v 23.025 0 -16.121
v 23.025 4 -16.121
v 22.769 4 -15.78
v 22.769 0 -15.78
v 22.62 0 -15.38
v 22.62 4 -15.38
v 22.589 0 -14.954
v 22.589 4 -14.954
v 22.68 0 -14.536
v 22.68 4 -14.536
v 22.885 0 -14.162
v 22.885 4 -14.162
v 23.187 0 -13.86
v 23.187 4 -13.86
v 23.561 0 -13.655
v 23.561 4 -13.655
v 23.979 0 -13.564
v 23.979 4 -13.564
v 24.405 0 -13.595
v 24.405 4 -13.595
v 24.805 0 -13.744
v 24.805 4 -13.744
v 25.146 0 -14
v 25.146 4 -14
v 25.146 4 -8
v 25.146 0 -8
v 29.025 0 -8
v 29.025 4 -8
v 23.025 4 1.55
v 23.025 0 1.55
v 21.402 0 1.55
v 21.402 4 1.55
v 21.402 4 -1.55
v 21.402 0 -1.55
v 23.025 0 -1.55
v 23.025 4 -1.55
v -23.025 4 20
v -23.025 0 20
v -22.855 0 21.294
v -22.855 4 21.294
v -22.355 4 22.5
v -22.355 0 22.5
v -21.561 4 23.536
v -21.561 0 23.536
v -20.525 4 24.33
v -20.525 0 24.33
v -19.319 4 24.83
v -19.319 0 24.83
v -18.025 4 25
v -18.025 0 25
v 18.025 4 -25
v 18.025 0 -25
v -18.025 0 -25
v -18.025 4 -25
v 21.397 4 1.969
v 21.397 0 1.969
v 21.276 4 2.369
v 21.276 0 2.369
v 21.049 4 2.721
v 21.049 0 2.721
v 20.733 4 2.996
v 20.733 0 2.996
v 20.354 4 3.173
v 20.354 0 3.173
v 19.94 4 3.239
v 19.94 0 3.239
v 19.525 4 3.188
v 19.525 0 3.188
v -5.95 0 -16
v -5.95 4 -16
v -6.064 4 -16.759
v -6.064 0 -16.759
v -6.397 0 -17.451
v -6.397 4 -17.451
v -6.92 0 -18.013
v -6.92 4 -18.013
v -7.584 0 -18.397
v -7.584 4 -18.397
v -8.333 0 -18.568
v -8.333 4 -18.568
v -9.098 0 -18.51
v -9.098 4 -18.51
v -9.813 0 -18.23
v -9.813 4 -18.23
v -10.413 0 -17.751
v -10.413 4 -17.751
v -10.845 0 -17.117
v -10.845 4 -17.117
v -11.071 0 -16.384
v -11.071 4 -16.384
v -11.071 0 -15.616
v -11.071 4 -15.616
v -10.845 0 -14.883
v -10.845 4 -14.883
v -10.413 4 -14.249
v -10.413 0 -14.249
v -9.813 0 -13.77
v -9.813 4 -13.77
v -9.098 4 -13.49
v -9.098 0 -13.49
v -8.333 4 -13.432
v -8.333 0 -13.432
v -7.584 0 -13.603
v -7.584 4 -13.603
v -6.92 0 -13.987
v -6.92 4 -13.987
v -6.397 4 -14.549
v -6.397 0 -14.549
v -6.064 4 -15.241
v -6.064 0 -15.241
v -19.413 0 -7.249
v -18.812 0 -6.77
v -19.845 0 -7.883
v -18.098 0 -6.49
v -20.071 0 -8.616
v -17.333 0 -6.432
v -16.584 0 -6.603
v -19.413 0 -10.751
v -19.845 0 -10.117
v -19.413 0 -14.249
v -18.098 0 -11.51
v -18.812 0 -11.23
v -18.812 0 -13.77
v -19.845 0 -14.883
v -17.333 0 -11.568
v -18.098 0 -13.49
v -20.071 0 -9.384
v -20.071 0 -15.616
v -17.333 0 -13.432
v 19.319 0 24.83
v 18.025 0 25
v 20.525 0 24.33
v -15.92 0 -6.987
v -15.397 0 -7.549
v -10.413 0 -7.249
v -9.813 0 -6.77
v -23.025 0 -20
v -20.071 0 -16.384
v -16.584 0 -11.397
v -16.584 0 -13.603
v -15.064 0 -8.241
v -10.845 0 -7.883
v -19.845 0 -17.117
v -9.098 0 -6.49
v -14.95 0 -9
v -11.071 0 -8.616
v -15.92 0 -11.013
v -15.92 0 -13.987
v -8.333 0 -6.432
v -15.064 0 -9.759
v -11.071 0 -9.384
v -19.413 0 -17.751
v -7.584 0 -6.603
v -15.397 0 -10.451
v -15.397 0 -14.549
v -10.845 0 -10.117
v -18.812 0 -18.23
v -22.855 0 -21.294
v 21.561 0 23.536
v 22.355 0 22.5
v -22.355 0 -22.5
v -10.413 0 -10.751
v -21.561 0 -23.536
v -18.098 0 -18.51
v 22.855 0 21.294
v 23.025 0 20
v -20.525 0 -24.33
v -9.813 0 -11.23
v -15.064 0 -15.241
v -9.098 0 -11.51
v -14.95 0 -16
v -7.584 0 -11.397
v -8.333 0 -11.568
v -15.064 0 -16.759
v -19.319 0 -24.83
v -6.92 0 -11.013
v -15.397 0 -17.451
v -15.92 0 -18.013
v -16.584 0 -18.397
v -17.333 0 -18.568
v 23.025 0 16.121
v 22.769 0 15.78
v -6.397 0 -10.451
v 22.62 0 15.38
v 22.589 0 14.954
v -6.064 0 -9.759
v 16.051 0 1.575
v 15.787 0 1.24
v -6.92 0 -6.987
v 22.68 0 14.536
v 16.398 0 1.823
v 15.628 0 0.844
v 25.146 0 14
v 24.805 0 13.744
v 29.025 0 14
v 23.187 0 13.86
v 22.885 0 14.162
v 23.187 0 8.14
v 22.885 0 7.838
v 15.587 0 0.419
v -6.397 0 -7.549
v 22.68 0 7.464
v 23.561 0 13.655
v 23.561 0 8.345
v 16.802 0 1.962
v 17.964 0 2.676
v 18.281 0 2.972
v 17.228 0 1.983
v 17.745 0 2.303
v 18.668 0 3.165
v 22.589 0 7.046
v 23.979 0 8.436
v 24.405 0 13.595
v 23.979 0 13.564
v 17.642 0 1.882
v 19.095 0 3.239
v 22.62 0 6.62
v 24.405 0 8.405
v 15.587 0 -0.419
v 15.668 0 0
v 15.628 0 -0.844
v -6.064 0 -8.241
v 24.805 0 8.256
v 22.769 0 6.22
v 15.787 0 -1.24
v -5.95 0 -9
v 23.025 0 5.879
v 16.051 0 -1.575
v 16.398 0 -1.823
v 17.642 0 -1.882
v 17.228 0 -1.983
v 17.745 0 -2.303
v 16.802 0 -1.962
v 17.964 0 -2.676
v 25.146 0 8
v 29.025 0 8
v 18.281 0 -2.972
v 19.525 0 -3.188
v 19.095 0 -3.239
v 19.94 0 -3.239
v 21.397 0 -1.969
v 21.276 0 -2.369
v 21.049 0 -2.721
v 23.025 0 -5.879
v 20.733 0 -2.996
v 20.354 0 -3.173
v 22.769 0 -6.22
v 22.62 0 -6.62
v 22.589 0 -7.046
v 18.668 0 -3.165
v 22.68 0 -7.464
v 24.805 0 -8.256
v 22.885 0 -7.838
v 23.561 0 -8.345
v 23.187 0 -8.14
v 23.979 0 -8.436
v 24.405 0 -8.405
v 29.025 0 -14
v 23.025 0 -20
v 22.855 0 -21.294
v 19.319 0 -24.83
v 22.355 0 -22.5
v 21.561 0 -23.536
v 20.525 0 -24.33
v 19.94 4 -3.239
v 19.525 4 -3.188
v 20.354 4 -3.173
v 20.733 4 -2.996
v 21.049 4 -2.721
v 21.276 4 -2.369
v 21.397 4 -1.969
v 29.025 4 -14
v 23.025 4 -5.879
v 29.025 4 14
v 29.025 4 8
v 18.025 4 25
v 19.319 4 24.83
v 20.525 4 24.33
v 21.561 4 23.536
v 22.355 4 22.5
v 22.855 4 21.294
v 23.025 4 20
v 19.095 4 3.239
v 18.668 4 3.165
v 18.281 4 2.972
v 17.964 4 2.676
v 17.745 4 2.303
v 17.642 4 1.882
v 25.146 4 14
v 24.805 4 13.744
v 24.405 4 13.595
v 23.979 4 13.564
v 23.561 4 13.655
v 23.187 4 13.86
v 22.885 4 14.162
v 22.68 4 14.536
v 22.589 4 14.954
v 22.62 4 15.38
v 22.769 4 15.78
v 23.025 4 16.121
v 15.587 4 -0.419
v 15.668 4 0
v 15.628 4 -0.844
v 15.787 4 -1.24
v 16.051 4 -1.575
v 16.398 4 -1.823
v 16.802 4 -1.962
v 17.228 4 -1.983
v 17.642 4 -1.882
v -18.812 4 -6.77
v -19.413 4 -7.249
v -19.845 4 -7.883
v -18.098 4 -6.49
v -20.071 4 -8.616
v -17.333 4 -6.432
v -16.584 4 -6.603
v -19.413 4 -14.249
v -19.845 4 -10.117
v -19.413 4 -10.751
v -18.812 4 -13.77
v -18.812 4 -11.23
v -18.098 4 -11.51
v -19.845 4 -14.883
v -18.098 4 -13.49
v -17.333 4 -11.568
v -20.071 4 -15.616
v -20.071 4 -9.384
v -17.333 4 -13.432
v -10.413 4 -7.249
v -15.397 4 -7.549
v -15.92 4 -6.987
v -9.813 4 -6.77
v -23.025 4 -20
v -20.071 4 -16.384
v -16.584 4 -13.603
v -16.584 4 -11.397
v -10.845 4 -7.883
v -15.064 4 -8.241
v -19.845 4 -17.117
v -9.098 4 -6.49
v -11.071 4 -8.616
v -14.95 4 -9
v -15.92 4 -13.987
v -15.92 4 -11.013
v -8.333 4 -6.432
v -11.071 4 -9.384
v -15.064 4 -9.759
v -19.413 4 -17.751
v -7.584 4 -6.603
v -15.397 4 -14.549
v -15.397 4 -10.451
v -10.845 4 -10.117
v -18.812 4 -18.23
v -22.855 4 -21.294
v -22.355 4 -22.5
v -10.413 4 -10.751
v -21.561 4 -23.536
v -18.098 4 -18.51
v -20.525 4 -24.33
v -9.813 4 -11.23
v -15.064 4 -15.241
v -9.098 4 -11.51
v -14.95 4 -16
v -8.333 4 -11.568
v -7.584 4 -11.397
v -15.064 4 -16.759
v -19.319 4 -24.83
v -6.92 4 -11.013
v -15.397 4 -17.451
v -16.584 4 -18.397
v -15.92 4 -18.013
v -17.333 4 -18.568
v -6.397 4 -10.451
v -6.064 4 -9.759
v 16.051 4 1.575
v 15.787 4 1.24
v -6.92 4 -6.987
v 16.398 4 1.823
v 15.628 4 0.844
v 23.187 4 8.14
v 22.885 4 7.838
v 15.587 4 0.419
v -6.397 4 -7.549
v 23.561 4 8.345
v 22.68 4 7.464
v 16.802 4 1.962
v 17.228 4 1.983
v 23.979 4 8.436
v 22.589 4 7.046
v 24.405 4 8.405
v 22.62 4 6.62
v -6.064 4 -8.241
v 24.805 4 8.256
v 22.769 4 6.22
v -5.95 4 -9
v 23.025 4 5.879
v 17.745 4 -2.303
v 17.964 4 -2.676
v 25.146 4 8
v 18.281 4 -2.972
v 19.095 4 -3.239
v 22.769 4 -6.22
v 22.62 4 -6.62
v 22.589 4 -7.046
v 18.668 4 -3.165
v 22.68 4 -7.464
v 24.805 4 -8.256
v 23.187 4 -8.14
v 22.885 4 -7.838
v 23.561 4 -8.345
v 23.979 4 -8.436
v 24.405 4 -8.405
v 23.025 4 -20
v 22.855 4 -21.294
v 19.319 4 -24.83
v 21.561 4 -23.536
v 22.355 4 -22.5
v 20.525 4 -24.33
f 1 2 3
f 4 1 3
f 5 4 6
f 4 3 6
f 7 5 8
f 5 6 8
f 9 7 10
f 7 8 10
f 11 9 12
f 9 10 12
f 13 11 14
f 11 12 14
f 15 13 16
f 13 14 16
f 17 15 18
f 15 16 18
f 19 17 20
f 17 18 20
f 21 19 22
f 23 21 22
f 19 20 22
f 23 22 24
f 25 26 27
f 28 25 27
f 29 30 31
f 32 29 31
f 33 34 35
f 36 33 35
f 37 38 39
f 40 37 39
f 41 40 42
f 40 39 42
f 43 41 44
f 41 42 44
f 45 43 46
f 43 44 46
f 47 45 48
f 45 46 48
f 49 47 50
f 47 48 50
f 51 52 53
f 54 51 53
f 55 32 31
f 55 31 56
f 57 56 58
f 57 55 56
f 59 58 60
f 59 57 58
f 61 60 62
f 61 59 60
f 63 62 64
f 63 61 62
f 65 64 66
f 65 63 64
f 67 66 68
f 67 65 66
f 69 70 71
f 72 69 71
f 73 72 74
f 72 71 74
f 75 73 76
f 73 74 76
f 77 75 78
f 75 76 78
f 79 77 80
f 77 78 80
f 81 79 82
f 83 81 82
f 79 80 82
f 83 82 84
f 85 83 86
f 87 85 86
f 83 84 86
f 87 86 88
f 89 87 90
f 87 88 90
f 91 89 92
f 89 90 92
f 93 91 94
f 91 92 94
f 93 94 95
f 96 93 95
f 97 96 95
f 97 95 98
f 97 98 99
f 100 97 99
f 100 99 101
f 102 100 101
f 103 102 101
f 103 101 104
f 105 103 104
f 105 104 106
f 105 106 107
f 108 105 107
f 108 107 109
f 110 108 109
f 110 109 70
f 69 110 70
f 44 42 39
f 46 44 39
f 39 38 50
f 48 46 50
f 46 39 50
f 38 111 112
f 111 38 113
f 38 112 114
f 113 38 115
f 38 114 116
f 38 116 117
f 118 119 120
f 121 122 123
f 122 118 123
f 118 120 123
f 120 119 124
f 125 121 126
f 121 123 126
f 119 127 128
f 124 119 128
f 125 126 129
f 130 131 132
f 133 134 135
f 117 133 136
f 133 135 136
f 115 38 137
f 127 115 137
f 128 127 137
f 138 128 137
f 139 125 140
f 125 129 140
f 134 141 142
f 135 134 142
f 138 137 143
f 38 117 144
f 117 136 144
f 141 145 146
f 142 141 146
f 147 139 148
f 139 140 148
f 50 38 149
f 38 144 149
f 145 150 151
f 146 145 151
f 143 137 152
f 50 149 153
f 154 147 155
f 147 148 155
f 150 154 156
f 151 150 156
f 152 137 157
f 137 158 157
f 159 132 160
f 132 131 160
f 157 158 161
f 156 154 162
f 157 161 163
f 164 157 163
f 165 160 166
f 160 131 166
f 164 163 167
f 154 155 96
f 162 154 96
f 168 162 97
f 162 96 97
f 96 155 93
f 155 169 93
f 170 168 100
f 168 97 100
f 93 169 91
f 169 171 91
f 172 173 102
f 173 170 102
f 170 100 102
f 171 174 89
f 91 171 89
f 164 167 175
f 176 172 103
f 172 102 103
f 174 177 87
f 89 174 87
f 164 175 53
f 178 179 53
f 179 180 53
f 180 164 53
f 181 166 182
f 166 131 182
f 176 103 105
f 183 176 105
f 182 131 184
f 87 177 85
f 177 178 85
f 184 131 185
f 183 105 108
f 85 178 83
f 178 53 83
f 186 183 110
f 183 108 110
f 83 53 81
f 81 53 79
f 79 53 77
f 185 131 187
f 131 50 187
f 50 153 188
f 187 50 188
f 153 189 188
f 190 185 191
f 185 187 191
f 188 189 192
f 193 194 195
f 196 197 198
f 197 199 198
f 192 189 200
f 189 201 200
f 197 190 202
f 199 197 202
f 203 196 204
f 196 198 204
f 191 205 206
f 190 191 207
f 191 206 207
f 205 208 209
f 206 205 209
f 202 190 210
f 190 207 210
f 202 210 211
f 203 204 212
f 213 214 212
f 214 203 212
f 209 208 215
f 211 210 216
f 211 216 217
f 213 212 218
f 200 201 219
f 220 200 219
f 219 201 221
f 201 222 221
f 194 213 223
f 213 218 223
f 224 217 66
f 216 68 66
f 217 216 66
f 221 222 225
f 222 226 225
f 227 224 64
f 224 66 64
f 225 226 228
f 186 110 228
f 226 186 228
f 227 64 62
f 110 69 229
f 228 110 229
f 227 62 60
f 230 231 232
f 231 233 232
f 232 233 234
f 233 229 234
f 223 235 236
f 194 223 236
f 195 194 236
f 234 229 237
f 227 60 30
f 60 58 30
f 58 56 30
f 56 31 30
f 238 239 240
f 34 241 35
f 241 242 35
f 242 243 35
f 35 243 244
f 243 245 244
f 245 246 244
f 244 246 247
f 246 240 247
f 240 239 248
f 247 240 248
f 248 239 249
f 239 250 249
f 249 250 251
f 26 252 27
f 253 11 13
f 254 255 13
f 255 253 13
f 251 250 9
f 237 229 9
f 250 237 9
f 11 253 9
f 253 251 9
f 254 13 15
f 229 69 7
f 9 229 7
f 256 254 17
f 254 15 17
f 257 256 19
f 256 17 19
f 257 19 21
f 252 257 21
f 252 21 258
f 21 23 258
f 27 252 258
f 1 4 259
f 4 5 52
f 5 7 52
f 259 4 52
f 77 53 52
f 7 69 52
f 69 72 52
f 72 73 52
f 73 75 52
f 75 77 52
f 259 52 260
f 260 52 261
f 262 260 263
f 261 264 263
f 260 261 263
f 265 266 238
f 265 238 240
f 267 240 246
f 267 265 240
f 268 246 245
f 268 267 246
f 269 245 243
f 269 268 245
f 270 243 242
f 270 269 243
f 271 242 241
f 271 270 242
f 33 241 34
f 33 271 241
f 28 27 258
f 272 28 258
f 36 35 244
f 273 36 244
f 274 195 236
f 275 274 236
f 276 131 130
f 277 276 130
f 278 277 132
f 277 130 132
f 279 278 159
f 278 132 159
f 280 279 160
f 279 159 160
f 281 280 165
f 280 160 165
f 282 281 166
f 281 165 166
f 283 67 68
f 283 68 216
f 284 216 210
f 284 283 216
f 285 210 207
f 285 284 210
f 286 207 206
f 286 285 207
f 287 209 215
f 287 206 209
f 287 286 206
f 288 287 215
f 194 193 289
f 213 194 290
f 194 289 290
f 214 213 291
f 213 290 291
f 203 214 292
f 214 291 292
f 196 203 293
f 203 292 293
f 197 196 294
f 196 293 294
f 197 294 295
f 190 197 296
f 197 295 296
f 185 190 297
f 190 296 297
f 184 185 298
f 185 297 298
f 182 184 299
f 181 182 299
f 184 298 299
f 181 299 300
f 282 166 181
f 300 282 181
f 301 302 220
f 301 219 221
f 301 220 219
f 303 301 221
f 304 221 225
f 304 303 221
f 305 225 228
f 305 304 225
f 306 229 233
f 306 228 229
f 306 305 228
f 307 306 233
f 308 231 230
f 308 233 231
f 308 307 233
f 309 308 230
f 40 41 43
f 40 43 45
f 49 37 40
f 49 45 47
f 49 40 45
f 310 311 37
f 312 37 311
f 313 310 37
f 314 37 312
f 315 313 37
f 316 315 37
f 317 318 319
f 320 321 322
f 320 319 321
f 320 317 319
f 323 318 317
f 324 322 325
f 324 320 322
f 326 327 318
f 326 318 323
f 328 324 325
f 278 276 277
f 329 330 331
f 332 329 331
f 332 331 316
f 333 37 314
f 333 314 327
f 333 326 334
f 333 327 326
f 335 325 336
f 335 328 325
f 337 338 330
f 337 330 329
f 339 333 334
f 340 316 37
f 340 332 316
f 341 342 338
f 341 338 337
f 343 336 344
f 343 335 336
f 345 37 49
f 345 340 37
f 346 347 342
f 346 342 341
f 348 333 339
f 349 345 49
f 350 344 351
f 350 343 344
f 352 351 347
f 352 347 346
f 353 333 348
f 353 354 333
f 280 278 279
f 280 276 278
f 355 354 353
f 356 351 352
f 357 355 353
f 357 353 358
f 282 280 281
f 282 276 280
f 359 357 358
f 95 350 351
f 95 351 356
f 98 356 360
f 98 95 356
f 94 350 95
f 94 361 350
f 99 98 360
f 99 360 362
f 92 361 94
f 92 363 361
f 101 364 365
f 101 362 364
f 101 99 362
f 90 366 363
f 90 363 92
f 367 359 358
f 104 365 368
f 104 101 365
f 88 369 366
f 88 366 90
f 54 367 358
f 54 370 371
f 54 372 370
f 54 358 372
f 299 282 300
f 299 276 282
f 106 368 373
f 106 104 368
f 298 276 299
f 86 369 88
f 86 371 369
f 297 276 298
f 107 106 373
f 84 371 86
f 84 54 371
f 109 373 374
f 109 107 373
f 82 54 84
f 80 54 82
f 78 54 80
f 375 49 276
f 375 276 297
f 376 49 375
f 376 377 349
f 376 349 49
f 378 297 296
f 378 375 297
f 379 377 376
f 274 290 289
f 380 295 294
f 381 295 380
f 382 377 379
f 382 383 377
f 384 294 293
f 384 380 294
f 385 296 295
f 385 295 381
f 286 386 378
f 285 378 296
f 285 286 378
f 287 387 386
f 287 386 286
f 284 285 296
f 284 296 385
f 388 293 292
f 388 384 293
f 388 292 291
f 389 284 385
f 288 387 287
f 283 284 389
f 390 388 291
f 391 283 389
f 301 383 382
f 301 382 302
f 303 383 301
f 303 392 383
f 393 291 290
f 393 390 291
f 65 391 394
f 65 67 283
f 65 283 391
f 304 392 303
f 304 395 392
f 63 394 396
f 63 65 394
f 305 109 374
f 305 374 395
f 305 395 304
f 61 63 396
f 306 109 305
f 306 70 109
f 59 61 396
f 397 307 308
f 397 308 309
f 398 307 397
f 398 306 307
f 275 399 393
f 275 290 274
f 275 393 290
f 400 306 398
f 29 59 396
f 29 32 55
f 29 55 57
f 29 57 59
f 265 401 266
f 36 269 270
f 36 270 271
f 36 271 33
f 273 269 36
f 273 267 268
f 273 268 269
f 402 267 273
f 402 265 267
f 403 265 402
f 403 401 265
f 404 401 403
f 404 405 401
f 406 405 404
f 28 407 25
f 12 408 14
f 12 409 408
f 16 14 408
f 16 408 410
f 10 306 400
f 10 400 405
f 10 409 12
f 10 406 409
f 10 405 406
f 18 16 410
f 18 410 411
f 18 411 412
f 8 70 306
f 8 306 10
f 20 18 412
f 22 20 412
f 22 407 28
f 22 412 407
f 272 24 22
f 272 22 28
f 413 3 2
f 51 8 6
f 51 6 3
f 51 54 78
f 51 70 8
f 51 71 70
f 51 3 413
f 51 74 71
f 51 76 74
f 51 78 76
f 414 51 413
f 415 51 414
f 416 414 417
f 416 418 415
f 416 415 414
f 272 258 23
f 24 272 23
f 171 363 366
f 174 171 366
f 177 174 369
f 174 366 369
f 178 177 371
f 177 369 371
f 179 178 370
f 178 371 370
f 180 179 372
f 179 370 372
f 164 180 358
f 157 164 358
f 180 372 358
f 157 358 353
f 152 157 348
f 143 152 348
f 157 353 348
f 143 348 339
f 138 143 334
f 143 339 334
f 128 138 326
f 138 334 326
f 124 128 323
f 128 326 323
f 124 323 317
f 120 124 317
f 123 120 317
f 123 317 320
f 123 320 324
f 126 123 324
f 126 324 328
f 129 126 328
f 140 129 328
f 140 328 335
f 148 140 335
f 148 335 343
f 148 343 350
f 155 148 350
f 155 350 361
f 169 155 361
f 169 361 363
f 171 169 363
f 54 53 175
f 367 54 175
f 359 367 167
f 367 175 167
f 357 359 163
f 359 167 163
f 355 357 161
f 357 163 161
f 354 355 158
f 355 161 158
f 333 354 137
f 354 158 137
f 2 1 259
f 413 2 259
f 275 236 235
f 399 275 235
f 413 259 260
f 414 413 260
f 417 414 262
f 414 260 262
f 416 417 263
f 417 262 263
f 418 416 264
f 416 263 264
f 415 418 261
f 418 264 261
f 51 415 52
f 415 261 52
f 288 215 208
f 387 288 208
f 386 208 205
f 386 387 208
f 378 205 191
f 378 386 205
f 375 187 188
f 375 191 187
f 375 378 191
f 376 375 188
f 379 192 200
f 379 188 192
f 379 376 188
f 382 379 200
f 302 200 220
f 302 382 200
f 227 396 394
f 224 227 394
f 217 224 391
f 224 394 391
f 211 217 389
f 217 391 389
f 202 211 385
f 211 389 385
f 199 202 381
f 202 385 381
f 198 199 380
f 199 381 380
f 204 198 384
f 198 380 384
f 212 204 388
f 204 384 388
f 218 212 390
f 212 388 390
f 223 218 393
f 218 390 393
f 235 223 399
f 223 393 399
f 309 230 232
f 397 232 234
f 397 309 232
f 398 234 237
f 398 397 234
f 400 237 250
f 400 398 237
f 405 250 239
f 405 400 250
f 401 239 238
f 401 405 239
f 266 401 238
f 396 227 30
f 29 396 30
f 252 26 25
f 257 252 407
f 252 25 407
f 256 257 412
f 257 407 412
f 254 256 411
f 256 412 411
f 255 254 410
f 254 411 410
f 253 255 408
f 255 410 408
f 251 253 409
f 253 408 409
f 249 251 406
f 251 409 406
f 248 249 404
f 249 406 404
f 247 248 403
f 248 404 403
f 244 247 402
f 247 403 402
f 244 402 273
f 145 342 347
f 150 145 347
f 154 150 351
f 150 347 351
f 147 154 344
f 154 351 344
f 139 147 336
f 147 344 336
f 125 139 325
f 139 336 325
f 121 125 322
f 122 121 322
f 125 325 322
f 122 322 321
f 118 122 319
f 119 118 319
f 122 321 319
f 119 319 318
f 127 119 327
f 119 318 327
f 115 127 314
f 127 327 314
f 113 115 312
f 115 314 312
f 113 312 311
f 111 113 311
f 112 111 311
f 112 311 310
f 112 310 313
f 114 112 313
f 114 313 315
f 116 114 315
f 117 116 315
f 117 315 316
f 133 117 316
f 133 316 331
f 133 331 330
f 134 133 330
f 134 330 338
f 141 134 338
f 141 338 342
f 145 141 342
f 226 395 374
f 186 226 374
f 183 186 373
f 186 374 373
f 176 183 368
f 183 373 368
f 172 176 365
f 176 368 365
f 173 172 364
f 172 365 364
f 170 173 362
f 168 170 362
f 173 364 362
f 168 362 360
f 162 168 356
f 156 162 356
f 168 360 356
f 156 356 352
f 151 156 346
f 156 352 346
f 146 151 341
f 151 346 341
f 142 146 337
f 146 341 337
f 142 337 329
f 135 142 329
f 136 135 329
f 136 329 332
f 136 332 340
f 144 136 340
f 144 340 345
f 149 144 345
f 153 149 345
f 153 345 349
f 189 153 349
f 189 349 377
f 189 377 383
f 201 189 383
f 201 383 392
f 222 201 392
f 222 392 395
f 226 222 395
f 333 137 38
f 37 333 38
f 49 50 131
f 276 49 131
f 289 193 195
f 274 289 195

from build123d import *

# Parameters (mm, degrees)
SALIENTE_EXTRUIR1_DEPTH = 4
CORTAR_EXTRUIR4_DEPTH   = 5
CROQUIS10_R             = 1.5
CORTAR_EXTRUIR5_DEPTH   = 5
CROQUIS12_R             = 2.575
CORTAR_EXTRUIR6_DEPTH   = 5


with BuildPart() as part:
    # Croquis1 → Saliente-Extruir1 (new body)
    with BuildSketch(Plane(origin=(0, 0, 0), x_dir=(1, 0, 0), z_dir=(0, 1, 0))):
        with BuildLine():
            Line((-18.025, -25), (18.025, -25))
            ThreePointArc((18.025, -25), (21.560533906, -23.535533906), (23.025, -20))
            Line((23.025, -20), (23.025, -14))
            Line((23.025, -14), (29.025, -14))
            Line((29.025, -14), (29.025, -8))
            Line((29.025, -8), (23.025, -8))
            Line((23.025, -8), (23.025, -1.55))
            Line((23.025, -1.55), (20.975, -1.55))
            Line((20.975, -1.55), (20.975, -2.8))
            Line((20.975, -2.8), (18.075, -2.8))
            Line((18.075, -2.8), (18.075, -1.55))
            Line((18.075, -1.55), (16.025, -1.55))
            Line((16.025, -1.55), (16.025, 1.55))
            Line((16.025, 1.55), (18.075, 1.55))
            Line((18.075, 1.55), (18.075, 2.8))
            Line((18.075, 2.8), (20.975, 2.8))
            Line((20.975, 2.8), (20.975, 1.55))
            Line((20.975, 1.55), (23.025, 1.55))
            Line((23.025, 1.55), (23.025, 8))
            Line((23.025, 8), (29.025, 8))
            Line((29.025, 8), (29.025, 14))
            Line((29.025, 14), (23.025, 14))
            Line((23.025, 14), (23.025, 20))
            ThreePointArc((23.025, 20), (21.560533906, 23.535533906), (18.025, 25))
            Line((18.025, 25), (-18.025, 25))
            ThreePointArc((-18.025, 25), (-21.560533906, 23.535533906), (-23.025, 20))
            Line((-23.025, 20), (-23.025, -20))
            ThreePointArc((-23.025, -20), (-21.560533906, -23.535533906), (-18.025, -25))
        make_face()
    extrude(amount=SALIENTE_EXTRUIR1_DEPTH)

    # Croquis7 → Cortar-Extruir4 (cut, through all)
    with BuildSketch(Plane(origin=(0, 4, 0), x_dir=(1, 0, 0), z_dir=(0, 1, 0))):
        with BuildLine():
            Line((21.402341989, 1.55), (23.025, 1.55))
            Line((23.025, 1.55), (23.025, -1.55))
            Line((23.025, -1.55), (21.402341989, -1.55))
            ThreePointArc((21.402341989, -1.55), (20.900478098, -2.869619136), (19.525, -3.187930349))
            ThreePointArc((19.525, -3.187930349), (18.280747615, -2.971867524), (17.642475162, -1.882163243))
            ThreePointArc((17.642475162, -1.882163243), (16.05076038, -1.575149398), (15.66772275, 0))
            ThreePointArc((15.66772275, 0), (16.05076038, 1.575149398), (17.642475162, 1.882163243))
            ThreePointArc((17.642475162, 1.882163243), (18.280747615, 2.971867524), (19.525, 3.187930349))
            ThreePointArc((19.525, 3.187930349), (20.900478098, 2.869619136), (21.402341989, 1.55))
        make_face()
    extrude(amount=-CORTAR_EXTRUIR4_DEPTH, mode=Mode.SUBTRACT)

    # Croquis10 → Cortar-Extruir5 (cut, through all)
    with BuildSketch(Plane(origin=(0, 4, 0), x_dir=(1, 0, 0), z_dir=(0, 1, 0))):
        with Locations((24.085660172, 15.060660172)):
            Circle(CROQUIS10_R)
        with Locations((24.085660172, 6.939339828)):
            Circle(CROQUIS10_R)
        with Locations((24.085660172, -15.060660172)):
            Circle(CROQUIS10_R)
        with Locations((24.085660172, -6.939339828)):
            Circle(CROQUIS10_R)
    extrude(amount=-CORTAR_EXTRUIR5_DEPTH, mode=Mode.SUBTRACT)

    # Croquis12 → Cortar-Extruir6 (cut, through all)
    with BuildSketch(Plane(origin=(0, 4, 0), x_dir=(1, 0, 0), z_dir=(0, 1, 0))):
        with Locations((-17.525, 16)):
            Circle(CROQUIS12_R)
        with Locations((-8.525, 16)):
            Circle(CROQUIS12_R)
        with Locations((-8.525, 9)):
            Circle(CROQUIS12_R)
        with Locations((-17.525, 9)):
            Circle(CROQUIS12_R)
    extrude(amount=-CORTAR_EXTRUIR6_DEPTH, mode=Mode.SUBTRACT)


solid = part.part
